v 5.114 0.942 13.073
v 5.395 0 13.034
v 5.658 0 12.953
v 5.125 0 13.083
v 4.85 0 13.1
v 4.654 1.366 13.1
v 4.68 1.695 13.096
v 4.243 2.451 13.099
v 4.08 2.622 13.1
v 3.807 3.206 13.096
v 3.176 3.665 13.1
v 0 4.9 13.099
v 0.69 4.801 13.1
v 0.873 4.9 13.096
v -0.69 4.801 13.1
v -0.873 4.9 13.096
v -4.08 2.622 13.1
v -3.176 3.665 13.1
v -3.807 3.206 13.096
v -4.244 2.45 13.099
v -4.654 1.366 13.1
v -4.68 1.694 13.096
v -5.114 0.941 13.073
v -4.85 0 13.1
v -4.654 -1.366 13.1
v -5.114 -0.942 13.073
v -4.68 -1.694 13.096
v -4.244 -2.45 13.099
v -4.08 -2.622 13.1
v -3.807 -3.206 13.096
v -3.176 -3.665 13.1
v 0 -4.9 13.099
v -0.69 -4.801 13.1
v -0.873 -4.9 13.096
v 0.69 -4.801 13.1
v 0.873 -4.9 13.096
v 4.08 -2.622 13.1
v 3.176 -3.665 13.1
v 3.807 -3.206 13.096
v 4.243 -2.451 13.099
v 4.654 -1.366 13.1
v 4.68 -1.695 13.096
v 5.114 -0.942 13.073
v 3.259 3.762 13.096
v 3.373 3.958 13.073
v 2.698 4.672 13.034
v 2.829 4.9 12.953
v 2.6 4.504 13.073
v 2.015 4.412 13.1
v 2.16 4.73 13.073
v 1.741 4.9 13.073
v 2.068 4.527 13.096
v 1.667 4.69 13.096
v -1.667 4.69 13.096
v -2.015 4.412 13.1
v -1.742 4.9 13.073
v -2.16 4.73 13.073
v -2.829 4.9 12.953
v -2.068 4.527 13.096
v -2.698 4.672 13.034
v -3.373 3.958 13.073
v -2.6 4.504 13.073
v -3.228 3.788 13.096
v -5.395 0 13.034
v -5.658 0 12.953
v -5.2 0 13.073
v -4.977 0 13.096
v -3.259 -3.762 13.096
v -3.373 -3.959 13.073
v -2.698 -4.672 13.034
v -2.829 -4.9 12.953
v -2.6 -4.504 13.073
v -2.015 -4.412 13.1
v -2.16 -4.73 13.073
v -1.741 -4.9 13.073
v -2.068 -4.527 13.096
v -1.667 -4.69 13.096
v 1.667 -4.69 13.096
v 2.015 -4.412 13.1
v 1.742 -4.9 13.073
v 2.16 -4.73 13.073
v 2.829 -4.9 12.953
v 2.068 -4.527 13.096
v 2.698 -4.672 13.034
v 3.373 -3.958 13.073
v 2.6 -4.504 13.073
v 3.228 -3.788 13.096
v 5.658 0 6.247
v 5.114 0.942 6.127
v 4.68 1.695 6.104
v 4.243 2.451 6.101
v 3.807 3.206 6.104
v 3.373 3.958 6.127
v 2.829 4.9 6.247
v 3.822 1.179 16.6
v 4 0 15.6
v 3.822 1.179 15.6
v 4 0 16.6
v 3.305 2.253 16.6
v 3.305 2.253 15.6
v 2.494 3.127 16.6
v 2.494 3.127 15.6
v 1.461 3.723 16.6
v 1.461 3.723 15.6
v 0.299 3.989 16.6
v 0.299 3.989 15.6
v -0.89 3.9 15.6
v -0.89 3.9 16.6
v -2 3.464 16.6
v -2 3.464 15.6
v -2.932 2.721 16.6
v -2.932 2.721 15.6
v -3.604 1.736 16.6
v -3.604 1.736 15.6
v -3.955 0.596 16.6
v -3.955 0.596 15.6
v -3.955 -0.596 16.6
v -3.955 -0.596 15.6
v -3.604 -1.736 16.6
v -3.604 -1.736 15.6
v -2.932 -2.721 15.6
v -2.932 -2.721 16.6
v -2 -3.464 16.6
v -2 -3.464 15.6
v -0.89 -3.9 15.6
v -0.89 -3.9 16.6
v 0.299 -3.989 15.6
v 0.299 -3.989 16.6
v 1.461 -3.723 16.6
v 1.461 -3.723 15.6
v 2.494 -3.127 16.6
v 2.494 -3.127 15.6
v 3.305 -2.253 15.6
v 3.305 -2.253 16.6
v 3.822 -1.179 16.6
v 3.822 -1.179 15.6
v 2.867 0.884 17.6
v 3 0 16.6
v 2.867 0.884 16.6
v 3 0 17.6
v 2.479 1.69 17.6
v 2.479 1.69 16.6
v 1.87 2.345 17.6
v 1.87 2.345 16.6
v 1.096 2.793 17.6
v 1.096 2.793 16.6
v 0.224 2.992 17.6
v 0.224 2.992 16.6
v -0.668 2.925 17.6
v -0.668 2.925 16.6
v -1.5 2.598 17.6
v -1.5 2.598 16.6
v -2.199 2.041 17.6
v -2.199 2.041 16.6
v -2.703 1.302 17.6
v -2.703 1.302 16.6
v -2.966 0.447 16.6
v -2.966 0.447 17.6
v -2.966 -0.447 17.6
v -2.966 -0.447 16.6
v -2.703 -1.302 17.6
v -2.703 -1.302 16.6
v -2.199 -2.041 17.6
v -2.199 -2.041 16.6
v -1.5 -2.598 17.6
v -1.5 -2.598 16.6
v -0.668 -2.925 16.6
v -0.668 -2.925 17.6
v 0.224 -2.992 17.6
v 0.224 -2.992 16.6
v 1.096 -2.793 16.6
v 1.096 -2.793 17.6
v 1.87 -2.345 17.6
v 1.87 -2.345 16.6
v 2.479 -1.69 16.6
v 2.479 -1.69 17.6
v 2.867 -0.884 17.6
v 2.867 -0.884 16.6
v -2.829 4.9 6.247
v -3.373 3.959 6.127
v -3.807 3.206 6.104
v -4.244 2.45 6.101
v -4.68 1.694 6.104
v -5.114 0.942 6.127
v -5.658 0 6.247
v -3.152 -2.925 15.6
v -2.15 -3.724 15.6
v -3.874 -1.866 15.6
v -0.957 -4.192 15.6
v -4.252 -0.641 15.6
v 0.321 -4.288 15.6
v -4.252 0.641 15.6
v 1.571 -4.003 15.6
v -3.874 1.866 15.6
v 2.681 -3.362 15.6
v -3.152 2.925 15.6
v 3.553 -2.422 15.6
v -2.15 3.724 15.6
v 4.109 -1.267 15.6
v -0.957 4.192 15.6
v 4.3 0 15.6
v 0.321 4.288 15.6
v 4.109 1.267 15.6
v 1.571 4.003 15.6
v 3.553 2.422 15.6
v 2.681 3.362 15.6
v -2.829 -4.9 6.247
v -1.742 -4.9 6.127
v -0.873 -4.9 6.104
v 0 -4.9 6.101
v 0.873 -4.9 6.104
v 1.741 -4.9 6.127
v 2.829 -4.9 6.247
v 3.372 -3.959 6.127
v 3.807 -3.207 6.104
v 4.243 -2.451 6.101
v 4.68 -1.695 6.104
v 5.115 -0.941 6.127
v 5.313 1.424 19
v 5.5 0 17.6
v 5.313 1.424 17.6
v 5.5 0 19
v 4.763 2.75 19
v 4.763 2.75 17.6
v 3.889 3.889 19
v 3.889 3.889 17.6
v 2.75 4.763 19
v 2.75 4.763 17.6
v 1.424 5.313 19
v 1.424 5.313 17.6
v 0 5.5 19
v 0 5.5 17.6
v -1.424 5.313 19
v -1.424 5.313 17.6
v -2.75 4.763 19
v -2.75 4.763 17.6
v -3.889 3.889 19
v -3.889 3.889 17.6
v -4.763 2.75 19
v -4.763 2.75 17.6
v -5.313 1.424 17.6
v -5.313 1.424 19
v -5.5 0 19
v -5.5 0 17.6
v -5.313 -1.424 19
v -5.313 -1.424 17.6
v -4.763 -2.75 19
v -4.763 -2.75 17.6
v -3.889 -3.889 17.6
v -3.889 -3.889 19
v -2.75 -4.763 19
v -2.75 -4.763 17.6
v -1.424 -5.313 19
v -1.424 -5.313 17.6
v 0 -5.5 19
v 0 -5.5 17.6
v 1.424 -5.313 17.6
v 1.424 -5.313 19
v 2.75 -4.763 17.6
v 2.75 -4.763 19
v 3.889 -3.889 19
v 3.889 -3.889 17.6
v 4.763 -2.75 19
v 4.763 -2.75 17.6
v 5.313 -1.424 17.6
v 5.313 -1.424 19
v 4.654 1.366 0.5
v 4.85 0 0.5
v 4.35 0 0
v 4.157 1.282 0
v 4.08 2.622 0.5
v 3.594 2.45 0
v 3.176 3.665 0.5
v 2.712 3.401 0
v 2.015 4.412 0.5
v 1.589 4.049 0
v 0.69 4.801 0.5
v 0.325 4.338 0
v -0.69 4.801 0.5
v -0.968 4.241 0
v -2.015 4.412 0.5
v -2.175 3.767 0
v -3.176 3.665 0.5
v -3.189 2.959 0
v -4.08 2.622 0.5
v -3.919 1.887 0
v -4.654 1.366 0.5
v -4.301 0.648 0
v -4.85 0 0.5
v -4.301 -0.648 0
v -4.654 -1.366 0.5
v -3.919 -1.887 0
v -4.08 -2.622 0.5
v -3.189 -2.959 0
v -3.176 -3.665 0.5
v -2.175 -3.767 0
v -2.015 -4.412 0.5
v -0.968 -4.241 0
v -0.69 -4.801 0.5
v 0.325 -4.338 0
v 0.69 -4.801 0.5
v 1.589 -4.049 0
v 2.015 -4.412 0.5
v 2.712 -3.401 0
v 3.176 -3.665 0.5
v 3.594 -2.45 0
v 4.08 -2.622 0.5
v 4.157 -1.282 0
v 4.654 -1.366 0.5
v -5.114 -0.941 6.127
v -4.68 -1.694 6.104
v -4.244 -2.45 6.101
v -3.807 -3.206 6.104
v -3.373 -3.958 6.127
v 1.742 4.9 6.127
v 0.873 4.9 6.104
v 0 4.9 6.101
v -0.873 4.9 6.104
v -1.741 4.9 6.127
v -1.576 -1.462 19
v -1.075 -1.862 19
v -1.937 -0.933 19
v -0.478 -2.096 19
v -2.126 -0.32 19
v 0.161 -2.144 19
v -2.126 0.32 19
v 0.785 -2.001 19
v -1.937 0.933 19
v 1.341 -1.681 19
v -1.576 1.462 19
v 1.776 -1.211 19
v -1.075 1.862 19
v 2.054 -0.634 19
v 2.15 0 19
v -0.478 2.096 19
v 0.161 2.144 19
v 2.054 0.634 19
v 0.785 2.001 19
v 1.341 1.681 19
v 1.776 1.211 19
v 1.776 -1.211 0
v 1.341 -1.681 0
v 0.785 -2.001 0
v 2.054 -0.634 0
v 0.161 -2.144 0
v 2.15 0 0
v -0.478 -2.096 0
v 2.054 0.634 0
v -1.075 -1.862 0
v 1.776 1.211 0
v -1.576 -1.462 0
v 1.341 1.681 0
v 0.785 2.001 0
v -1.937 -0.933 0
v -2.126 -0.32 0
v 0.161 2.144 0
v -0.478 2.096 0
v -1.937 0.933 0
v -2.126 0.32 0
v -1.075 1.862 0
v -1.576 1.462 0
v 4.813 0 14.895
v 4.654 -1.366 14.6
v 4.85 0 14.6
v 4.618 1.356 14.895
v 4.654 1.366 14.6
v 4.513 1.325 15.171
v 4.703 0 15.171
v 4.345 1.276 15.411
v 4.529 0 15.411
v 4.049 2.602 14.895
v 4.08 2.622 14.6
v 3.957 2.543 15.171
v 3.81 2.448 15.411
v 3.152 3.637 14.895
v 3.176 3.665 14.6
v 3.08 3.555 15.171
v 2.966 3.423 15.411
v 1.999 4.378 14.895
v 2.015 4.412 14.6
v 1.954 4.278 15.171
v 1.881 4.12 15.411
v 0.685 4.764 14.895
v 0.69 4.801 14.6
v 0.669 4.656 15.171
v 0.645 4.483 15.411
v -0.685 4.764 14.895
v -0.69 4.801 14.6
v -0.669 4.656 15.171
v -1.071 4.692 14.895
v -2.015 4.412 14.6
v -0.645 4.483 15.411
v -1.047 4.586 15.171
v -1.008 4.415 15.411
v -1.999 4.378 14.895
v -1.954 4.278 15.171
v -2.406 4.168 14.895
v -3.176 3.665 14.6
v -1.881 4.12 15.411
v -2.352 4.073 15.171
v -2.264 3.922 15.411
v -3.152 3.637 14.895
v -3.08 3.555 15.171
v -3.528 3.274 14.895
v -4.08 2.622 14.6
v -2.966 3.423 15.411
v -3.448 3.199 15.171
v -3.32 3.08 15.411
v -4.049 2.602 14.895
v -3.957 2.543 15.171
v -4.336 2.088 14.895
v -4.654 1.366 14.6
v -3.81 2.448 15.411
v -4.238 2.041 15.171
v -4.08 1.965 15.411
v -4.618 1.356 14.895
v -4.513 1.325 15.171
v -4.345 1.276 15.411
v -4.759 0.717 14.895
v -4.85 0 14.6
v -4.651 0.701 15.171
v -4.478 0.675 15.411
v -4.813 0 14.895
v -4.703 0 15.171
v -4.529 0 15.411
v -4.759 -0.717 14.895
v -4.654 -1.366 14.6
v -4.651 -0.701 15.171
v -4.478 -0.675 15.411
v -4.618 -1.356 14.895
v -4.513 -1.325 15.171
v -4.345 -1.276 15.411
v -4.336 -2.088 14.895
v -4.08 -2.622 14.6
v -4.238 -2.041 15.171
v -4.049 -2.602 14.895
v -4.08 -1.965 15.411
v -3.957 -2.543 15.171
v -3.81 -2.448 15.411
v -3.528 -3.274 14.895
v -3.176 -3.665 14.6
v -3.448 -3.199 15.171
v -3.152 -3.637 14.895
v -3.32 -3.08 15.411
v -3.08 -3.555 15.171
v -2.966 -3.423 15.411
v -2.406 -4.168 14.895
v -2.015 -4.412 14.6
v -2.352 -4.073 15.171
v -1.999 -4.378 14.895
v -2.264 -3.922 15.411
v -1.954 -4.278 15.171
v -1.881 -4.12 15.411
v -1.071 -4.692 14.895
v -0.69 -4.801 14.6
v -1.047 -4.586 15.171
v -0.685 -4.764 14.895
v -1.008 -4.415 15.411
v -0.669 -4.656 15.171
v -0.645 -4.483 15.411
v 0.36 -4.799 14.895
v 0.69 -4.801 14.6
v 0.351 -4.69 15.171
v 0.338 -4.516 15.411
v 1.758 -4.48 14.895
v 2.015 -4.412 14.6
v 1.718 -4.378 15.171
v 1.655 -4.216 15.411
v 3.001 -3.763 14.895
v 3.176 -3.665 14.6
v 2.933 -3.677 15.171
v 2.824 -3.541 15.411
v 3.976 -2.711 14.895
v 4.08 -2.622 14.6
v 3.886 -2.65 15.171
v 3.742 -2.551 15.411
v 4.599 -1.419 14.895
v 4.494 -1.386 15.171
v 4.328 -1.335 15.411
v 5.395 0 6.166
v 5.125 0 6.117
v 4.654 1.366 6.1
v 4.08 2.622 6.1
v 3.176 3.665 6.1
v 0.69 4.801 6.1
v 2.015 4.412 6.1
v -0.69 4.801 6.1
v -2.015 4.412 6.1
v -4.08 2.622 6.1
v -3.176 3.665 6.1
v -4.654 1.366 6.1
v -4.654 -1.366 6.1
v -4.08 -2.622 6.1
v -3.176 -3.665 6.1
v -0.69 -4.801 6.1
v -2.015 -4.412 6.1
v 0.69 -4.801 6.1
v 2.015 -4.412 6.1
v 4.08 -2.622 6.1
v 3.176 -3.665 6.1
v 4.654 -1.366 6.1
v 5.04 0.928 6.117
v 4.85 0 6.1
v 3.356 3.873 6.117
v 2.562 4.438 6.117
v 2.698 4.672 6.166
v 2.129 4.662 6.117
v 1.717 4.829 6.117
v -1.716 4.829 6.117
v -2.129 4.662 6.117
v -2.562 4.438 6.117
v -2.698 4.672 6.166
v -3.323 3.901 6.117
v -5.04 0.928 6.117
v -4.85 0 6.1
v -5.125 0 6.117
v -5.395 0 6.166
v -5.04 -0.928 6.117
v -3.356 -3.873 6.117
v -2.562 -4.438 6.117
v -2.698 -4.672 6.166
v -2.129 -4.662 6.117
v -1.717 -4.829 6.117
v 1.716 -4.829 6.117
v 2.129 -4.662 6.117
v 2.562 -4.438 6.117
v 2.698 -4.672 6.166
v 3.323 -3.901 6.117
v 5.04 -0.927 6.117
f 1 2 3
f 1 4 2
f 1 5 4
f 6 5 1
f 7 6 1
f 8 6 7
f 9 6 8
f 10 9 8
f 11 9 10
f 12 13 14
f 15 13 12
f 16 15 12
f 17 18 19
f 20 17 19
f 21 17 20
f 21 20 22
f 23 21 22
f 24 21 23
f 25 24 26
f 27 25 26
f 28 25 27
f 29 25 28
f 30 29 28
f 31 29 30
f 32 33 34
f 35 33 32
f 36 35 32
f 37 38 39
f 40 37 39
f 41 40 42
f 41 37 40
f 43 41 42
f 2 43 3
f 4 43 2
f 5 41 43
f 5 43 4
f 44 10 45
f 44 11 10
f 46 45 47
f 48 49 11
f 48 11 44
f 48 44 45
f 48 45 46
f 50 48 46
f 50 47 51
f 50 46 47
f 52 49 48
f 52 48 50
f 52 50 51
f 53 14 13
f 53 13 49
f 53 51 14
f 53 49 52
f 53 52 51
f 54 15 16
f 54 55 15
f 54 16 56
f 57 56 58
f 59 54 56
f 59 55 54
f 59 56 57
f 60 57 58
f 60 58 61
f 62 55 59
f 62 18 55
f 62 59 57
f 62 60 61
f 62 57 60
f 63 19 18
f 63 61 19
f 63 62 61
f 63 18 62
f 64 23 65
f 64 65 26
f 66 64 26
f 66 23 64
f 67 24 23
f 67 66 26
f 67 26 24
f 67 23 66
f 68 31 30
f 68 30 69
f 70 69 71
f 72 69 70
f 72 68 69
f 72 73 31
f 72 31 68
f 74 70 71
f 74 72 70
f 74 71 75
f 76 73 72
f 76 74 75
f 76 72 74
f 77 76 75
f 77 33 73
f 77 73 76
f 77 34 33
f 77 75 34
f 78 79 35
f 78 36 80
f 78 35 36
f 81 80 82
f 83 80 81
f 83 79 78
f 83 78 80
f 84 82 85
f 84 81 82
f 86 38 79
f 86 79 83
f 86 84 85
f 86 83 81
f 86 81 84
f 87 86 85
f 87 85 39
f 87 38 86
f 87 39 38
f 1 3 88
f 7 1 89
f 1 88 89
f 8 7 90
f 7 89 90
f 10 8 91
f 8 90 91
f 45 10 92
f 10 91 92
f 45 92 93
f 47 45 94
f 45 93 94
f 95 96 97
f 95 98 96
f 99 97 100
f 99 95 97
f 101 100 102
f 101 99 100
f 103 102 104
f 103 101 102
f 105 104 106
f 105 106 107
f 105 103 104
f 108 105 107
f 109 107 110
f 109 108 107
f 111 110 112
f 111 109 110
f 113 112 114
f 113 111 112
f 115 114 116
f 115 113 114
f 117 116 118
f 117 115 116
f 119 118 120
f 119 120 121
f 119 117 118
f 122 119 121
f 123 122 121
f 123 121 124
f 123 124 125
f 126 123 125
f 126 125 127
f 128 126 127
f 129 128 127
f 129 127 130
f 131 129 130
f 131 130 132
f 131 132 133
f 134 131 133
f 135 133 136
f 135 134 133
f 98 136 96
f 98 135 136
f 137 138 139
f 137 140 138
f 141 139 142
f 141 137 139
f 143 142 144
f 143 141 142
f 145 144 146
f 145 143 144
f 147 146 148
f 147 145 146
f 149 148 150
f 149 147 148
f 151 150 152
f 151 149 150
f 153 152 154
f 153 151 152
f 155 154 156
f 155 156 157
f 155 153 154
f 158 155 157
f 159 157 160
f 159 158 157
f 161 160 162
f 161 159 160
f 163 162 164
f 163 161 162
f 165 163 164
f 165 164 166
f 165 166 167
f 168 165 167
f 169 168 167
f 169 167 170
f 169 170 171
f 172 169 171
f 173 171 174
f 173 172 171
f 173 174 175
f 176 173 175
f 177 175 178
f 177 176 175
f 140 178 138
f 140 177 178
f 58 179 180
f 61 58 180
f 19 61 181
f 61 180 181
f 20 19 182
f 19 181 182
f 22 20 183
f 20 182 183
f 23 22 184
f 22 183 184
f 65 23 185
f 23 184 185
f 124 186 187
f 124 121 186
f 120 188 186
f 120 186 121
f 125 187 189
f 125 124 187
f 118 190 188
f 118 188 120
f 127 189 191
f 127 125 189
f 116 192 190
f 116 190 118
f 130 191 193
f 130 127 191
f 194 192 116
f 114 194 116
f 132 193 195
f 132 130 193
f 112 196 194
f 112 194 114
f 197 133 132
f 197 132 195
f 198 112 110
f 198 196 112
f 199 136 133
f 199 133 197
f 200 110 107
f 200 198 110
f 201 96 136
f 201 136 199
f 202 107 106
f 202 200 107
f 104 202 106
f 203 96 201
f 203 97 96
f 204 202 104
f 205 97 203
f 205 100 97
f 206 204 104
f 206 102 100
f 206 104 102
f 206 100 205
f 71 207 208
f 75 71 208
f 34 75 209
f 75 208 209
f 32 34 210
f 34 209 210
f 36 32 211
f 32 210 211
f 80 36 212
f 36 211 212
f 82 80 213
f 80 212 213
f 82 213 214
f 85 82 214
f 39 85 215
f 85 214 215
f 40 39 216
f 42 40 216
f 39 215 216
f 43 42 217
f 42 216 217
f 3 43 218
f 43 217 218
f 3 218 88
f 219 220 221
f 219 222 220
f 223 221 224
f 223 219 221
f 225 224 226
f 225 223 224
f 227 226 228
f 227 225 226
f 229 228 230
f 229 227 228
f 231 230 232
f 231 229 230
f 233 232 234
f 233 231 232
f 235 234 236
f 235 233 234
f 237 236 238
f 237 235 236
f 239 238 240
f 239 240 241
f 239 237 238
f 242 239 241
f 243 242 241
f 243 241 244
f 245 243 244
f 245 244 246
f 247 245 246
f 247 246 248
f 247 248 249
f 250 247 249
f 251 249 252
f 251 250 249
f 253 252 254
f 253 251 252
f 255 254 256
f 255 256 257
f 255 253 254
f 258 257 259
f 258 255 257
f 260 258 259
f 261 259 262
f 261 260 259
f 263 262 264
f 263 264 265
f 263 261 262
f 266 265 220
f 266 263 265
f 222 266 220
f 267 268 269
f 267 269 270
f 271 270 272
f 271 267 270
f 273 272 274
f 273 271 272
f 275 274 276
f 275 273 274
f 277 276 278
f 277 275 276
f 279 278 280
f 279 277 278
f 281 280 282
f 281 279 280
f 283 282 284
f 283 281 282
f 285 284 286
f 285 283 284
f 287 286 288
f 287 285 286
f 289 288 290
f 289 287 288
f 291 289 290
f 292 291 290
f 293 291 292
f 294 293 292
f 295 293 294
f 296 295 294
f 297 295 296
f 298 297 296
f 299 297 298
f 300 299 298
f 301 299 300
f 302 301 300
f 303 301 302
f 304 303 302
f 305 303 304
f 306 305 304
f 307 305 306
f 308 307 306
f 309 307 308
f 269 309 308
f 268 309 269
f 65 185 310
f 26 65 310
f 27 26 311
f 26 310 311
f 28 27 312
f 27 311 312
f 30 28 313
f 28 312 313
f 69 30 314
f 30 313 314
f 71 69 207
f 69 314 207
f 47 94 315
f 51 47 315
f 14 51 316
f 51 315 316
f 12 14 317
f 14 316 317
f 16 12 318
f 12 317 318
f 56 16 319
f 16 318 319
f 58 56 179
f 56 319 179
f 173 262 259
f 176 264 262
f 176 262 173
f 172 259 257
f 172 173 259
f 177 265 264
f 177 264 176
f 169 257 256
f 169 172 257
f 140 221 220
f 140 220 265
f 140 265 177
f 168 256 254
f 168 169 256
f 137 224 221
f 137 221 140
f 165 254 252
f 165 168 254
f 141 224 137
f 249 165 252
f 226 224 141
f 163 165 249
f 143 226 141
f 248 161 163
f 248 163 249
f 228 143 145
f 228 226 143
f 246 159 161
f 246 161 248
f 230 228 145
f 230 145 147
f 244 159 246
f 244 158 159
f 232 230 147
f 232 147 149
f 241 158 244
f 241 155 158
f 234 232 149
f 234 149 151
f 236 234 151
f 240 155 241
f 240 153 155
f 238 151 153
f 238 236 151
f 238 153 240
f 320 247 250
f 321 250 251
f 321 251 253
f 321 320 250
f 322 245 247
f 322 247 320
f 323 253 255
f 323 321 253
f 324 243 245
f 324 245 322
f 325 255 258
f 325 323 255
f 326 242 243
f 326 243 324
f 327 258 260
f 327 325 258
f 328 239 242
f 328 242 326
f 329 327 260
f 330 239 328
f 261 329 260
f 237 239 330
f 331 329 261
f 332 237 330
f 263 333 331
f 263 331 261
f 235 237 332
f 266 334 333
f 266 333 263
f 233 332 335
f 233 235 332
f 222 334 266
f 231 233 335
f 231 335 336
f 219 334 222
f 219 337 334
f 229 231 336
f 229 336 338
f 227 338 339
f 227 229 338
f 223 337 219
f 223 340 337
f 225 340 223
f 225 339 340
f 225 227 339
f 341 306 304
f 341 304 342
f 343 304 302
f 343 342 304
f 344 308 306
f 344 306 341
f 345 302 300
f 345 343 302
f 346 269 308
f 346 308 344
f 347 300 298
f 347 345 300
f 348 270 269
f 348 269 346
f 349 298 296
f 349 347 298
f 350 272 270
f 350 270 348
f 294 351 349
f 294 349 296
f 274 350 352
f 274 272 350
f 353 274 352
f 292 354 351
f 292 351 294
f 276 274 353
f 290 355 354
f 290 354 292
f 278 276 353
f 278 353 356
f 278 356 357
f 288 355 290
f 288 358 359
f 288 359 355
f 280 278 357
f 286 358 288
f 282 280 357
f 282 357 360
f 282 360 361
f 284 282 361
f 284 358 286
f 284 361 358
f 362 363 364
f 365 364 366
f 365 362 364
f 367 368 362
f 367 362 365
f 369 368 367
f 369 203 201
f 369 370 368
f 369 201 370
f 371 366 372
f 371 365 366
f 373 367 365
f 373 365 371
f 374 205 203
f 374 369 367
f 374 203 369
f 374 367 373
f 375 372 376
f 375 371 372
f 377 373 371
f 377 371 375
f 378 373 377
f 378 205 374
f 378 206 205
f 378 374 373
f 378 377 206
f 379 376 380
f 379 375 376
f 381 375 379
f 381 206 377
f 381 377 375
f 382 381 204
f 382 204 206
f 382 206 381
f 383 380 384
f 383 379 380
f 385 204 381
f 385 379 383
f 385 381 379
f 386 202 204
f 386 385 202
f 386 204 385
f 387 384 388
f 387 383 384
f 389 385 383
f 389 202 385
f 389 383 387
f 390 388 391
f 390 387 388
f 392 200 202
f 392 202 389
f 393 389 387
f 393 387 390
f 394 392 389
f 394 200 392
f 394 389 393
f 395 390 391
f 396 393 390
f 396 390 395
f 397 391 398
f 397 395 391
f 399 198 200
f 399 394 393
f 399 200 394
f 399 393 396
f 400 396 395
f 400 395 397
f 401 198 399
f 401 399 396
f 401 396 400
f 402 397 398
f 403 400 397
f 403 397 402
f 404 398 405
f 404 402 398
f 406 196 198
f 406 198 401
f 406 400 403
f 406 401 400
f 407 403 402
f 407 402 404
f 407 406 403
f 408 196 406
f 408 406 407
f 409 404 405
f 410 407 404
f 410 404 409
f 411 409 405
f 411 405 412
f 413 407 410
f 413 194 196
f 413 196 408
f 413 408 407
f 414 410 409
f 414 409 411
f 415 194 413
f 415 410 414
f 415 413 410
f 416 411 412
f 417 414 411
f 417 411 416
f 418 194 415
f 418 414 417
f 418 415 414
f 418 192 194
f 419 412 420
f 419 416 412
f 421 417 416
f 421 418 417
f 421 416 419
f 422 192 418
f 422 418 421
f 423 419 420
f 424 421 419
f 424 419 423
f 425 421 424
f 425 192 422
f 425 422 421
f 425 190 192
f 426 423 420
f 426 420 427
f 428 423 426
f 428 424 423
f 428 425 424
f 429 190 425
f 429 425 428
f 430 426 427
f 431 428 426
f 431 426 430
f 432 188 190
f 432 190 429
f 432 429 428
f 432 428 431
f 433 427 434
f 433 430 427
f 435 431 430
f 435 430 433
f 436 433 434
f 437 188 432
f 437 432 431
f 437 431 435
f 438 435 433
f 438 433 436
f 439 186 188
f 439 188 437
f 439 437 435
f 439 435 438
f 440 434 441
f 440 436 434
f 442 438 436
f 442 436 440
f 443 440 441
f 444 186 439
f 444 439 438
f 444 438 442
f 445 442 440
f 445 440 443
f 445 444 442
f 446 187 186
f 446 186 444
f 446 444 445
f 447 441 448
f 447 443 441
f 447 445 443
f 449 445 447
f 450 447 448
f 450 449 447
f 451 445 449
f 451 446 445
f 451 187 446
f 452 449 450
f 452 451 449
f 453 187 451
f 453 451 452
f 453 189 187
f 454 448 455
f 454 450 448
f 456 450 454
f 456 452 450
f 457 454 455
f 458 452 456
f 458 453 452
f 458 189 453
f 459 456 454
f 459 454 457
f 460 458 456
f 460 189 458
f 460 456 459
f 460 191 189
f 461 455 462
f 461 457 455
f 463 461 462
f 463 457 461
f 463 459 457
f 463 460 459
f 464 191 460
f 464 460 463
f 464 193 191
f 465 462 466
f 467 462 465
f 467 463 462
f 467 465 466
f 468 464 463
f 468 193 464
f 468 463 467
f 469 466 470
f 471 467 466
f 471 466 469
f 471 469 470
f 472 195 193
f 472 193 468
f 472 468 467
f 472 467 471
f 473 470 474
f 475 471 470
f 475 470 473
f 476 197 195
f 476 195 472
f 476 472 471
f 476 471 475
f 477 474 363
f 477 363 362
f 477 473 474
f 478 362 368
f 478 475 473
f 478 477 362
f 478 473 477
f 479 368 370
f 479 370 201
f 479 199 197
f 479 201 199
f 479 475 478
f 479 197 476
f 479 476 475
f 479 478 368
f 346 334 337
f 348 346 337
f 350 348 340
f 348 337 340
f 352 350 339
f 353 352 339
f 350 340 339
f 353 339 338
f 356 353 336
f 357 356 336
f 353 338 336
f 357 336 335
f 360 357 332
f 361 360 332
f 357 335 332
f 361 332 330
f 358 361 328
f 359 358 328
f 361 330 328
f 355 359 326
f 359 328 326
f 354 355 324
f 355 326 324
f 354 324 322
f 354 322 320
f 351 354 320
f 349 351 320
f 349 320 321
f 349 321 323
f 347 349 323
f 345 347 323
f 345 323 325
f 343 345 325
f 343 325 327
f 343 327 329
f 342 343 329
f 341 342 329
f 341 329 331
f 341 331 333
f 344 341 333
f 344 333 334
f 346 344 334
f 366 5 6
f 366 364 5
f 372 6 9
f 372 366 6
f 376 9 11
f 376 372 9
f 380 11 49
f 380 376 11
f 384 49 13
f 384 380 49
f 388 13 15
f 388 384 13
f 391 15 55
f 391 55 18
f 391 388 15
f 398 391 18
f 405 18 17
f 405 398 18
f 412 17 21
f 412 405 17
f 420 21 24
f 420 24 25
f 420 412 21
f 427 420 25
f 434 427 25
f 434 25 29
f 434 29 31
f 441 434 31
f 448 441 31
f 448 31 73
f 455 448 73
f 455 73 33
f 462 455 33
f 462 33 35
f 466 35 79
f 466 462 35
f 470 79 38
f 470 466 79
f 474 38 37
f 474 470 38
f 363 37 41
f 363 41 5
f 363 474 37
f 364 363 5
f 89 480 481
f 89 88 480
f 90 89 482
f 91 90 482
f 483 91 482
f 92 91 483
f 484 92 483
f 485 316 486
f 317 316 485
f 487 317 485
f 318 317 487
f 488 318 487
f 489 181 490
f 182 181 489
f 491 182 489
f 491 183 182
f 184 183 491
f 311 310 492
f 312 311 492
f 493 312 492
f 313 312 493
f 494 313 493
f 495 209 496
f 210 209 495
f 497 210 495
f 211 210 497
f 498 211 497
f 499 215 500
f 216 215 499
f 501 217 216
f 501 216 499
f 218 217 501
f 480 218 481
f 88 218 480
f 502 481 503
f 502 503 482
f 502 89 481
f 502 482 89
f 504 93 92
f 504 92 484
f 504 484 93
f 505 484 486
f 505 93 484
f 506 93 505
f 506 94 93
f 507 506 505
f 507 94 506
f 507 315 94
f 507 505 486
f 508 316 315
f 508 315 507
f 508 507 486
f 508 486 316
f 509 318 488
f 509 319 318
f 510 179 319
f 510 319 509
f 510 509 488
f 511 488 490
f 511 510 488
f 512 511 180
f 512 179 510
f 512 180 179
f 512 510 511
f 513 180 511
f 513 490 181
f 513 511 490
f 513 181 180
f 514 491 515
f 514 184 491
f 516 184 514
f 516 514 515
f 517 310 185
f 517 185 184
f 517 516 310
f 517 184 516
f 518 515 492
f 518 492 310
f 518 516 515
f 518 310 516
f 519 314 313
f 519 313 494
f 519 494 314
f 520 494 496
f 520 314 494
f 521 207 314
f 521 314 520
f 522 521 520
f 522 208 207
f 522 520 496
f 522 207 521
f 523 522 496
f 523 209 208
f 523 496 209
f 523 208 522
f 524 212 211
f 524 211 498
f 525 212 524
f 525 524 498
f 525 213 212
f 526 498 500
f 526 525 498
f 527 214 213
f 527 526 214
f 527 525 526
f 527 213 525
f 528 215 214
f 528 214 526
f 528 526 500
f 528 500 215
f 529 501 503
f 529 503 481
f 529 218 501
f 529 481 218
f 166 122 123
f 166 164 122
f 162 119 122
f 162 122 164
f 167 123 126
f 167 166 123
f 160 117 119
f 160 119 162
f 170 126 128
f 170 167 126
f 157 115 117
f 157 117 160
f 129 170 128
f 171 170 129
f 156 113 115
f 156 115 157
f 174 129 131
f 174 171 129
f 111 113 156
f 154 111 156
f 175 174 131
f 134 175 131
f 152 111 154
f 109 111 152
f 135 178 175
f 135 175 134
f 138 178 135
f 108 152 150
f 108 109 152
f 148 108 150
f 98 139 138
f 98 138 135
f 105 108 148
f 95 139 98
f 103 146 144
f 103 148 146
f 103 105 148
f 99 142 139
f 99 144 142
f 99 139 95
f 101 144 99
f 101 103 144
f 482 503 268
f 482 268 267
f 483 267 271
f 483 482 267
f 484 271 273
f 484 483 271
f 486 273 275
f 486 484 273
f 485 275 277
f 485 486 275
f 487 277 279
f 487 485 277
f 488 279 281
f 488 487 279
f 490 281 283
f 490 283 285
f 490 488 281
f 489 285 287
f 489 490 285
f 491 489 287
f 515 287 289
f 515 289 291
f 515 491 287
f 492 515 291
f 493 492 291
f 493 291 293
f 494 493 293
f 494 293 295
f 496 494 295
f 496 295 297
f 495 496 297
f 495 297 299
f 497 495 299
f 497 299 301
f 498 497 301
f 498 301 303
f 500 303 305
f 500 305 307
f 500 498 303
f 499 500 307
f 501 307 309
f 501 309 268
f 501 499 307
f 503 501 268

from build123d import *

# Parameters (mm, degrees)
F2_R     = 2.15
F3_DEPTH = 19.001
F4_R     = 9
F5_DEPTH = 14
F6_SIZE  = 0.5


with BuildPart() as f1:
    # F0 (on Front) → F1 (revolve)
    with BuildSketch(Plane.XZ):
        with BuildLine():
            Line((0, 19), (0, 0))
            Line((0, 0), (4.85, 0))
            Line((4.85, 0), (4.85, 6.1))
            ThreePointArc((4.85, 6.1), (6.160773, 6.512059), (7, 7.6))
            Line((7, 7.6), (7, 11.6))
            ThreePointArc((7, 11.6), (6.160773, 12.687941), (4.85, 13.1))
            Line((4.85, 13.1), (4.85, 14.6))
            ThreePointArc((4.85, 14.6), (4.703428, 15.170636), (4.3, 15.6))
            Line((4.3, 15.6), (4, 15.6))
            Line((4, 15.6), (4, 16.6))
            Line((4, 16.6), (3, 16.6))
            Line((3, 16.6), (3, 17.6))
            Line((3, 17.6), (5.5, 17.6))
            Line((5.5, 17.6), (5.5, 19))
            Line((5.5, 19), (0, 19))
        make_face()
    revolve(axis=Axis((0, 0, 9.5), (0, 0, 1)))

    # F2 (on face) → F3 (cut, through all)
    with BuildSketch(Plane.XY.offset(19)):
        Circle(F2_R)
    extrude(amount=-F3_DEPTH, mode=Mode.SUBTRACT)

    # F4 (on face) → F5 (cut)
    with BuildSketch(Plane(origin=(0, 0, 0), x_dir=(1, 0, 0), z_dir=(0, 0, -1))):
        Circle(F4_R)
        Polygon((-2.829016, 4.9), (2.829016, 4.9), (5.658033, 0), (2.829016, -4.9), (-2.829016, -4.9), (-5.658033, 0), align=None, mode=Mode.SUBTRACT)
    extrude(amount=-F5_DEPTH, mode=Mode.SUBTRACT)

    # F6
    f6_edges = [f1.edges().sort_by_distance(p)[0] for p in [
        (-4.85, 0, 0),
    ]]
    chamfer(f6_edges, length=F6_SIZE)


solid = f1.part
